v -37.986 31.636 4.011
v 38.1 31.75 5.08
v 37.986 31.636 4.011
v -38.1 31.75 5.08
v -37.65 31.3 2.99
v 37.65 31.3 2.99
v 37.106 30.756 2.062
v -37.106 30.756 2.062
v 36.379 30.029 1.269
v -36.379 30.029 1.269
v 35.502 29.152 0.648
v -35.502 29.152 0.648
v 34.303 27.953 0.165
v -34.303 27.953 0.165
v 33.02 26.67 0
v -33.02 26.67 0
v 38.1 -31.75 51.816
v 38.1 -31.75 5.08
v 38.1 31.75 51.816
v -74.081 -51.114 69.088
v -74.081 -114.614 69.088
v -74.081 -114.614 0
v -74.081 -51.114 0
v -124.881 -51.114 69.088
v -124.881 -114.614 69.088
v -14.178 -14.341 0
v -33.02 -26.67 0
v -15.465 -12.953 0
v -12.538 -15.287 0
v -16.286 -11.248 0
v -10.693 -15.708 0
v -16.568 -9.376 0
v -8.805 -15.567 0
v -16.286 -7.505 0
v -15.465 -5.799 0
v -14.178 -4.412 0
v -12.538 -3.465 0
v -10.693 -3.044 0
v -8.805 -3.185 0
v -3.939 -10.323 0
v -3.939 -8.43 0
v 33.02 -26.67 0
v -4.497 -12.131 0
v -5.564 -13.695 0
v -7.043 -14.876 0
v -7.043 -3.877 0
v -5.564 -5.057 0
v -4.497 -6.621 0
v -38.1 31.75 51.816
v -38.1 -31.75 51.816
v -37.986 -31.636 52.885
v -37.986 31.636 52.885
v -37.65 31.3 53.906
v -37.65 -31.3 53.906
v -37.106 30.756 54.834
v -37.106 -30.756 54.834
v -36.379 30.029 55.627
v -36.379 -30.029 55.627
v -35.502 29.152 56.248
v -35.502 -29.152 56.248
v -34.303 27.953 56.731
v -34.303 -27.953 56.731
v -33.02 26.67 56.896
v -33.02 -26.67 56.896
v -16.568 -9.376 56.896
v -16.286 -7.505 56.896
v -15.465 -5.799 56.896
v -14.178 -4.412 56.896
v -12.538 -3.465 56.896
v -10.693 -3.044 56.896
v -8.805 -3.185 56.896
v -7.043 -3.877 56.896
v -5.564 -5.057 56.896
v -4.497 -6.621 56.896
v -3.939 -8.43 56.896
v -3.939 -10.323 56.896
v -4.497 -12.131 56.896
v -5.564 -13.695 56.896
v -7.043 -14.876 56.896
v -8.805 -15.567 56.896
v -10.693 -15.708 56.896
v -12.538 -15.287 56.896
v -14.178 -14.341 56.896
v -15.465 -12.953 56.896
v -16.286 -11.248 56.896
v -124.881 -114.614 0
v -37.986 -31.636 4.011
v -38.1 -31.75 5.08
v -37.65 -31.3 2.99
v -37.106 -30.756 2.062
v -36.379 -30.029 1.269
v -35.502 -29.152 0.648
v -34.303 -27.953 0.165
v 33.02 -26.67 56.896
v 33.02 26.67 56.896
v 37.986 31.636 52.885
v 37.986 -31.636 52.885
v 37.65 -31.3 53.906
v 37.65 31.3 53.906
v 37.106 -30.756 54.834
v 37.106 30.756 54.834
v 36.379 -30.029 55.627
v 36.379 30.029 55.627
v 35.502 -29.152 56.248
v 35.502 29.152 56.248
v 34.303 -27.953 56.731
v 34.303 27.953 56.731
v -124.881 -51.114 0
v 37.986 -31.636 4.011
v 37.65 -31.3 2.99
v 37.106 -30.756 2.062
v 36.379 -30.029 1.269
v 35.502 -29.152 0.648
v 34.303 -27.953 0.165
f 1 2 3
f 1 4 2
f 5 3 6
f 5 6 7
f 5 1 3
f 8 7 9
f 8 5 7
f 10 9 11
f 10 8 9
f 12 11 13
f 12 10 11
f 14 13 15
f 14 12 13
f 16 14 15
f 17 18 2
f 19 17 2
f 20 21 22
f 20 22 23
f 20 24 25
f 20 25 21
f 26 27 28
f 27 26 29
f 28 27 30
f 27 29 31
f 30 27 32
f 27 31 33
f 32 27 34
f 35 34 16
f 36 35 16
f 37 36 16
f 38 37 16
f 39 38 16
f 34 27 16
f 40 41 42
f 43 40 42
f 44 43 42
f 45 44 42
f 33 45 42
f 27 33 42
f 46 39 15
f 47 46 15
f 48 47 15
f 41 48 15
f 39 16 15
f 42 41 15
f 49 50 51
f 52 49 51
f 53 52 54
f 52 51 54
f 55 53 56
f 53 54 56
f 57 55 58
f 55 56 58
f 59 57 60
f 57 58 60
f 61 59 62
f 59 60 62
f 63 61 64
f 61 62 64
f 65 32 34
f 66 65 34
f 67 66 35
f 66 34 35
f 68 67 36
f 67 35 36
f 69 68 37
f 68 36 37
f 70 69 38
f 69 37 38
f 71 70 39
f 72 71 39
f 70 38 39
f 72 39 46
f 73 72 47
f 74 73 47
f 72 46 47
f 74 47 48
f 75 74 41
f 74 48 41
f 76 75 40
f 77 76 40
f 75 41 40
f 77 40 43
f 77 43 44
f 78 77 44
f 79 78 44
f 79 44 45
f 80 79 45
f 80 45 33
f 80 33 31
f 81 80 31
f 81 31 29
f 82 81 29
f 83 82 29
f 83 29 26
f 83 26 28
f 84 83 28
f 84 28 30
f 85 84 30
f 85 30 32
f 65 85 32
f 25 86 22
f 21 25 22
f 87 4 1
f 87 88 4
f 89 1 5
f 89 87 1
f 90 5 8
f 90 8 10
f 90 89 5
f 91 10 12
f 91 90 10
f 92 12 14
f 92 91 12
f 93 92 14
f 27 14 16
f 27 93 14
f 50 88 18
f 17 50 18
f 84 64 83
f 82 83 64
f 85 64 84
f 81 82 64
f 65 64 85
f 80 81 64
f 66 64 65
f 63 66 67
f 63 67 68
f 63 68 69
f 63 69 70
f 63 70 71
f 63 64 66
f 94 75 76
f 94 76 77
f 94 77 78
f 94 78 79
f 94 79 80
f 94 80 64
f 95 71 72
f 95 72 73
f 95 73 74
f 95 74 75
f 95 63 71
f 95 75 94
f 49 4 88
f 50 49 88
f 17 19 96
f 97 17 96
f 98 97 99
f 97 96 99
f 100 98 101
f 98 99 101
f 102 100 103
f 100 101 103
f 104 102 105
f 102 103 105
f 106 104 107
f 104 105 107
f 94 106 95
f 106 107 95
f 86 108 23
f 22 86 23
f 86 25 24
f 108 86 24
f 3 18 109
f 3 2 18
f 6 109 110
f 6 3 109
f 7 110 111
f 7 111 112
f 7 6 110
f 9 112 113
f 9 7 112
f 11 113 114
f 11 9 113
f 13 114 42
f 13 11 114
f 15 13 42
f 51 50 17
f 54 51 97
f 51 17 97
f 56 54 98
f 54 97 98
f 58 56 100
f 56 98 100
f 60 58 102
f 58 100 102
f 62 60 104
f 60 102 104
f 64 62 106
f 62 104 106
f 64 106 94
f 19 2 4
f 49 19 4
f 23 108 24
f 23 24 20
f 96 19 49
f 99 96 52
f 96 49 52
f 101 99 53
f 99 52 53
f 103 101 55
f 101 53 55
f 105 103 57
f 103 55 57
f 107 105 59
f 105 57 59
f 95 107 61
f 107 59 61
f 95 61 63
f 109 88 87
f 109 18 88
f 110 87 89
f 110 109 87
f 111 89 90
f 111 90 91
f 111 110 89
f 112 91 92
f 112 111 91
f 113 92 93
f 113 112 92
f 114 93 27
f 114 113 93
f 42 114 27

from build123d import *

# Parameters (mm, degrees)
F1_DEPTH = 56.896
F2_R     = 5.08
F4_D     = 12.7
F5_W     = 50.8
F5_H     = 63.5
F6_DEPTH = 69.088


with BuildPart() as f1:
    # F0 (on Top) → F1 (new body)
    with BuildSketch(Plane.XY):
        Polygon((38.1, 31.75), (0, 31.75), (-38.1, 31.75), (-38.1, 0), (-38.1, -31.75), (0, -31.75), (38.1, -31.75), (38.1, 0), align=None)
    extrude(amount=F1_DEPTH)

    # F2
    f2_edges = [f1.edges().sort_by_distance(p)[0] for p in [
        (0, 31.75, 56.896),
        (-38.1, 0, 56.896),
        (0, -31.75, 56.896),
        (38.1, 0, 56.896),
        (0, 31.75, 0),
        (-38.1, 0, 0),
        (0, -31.75, 0),
        (38.1, 0, 0),
    ]]
    fillet(f2_edges, radius=F2_R)

    # F4 (through all)
    with Locations(Plane.XY.offset(56.896)):
        with Locations((-10.218471, -9.376245)):
            Hole(F4_D / 2)


with BuildPart() as f6:
    # F5 (on Top) → F6 (new body)
    with BuildSketch(Plane.XY):
        with Locations((-99.480659, -82.864088)):
            Rectangle(F5_W, F5_H)
    extrude(amount=F6_DEPTH)


solid = Compound([f1.part, f6.part])
